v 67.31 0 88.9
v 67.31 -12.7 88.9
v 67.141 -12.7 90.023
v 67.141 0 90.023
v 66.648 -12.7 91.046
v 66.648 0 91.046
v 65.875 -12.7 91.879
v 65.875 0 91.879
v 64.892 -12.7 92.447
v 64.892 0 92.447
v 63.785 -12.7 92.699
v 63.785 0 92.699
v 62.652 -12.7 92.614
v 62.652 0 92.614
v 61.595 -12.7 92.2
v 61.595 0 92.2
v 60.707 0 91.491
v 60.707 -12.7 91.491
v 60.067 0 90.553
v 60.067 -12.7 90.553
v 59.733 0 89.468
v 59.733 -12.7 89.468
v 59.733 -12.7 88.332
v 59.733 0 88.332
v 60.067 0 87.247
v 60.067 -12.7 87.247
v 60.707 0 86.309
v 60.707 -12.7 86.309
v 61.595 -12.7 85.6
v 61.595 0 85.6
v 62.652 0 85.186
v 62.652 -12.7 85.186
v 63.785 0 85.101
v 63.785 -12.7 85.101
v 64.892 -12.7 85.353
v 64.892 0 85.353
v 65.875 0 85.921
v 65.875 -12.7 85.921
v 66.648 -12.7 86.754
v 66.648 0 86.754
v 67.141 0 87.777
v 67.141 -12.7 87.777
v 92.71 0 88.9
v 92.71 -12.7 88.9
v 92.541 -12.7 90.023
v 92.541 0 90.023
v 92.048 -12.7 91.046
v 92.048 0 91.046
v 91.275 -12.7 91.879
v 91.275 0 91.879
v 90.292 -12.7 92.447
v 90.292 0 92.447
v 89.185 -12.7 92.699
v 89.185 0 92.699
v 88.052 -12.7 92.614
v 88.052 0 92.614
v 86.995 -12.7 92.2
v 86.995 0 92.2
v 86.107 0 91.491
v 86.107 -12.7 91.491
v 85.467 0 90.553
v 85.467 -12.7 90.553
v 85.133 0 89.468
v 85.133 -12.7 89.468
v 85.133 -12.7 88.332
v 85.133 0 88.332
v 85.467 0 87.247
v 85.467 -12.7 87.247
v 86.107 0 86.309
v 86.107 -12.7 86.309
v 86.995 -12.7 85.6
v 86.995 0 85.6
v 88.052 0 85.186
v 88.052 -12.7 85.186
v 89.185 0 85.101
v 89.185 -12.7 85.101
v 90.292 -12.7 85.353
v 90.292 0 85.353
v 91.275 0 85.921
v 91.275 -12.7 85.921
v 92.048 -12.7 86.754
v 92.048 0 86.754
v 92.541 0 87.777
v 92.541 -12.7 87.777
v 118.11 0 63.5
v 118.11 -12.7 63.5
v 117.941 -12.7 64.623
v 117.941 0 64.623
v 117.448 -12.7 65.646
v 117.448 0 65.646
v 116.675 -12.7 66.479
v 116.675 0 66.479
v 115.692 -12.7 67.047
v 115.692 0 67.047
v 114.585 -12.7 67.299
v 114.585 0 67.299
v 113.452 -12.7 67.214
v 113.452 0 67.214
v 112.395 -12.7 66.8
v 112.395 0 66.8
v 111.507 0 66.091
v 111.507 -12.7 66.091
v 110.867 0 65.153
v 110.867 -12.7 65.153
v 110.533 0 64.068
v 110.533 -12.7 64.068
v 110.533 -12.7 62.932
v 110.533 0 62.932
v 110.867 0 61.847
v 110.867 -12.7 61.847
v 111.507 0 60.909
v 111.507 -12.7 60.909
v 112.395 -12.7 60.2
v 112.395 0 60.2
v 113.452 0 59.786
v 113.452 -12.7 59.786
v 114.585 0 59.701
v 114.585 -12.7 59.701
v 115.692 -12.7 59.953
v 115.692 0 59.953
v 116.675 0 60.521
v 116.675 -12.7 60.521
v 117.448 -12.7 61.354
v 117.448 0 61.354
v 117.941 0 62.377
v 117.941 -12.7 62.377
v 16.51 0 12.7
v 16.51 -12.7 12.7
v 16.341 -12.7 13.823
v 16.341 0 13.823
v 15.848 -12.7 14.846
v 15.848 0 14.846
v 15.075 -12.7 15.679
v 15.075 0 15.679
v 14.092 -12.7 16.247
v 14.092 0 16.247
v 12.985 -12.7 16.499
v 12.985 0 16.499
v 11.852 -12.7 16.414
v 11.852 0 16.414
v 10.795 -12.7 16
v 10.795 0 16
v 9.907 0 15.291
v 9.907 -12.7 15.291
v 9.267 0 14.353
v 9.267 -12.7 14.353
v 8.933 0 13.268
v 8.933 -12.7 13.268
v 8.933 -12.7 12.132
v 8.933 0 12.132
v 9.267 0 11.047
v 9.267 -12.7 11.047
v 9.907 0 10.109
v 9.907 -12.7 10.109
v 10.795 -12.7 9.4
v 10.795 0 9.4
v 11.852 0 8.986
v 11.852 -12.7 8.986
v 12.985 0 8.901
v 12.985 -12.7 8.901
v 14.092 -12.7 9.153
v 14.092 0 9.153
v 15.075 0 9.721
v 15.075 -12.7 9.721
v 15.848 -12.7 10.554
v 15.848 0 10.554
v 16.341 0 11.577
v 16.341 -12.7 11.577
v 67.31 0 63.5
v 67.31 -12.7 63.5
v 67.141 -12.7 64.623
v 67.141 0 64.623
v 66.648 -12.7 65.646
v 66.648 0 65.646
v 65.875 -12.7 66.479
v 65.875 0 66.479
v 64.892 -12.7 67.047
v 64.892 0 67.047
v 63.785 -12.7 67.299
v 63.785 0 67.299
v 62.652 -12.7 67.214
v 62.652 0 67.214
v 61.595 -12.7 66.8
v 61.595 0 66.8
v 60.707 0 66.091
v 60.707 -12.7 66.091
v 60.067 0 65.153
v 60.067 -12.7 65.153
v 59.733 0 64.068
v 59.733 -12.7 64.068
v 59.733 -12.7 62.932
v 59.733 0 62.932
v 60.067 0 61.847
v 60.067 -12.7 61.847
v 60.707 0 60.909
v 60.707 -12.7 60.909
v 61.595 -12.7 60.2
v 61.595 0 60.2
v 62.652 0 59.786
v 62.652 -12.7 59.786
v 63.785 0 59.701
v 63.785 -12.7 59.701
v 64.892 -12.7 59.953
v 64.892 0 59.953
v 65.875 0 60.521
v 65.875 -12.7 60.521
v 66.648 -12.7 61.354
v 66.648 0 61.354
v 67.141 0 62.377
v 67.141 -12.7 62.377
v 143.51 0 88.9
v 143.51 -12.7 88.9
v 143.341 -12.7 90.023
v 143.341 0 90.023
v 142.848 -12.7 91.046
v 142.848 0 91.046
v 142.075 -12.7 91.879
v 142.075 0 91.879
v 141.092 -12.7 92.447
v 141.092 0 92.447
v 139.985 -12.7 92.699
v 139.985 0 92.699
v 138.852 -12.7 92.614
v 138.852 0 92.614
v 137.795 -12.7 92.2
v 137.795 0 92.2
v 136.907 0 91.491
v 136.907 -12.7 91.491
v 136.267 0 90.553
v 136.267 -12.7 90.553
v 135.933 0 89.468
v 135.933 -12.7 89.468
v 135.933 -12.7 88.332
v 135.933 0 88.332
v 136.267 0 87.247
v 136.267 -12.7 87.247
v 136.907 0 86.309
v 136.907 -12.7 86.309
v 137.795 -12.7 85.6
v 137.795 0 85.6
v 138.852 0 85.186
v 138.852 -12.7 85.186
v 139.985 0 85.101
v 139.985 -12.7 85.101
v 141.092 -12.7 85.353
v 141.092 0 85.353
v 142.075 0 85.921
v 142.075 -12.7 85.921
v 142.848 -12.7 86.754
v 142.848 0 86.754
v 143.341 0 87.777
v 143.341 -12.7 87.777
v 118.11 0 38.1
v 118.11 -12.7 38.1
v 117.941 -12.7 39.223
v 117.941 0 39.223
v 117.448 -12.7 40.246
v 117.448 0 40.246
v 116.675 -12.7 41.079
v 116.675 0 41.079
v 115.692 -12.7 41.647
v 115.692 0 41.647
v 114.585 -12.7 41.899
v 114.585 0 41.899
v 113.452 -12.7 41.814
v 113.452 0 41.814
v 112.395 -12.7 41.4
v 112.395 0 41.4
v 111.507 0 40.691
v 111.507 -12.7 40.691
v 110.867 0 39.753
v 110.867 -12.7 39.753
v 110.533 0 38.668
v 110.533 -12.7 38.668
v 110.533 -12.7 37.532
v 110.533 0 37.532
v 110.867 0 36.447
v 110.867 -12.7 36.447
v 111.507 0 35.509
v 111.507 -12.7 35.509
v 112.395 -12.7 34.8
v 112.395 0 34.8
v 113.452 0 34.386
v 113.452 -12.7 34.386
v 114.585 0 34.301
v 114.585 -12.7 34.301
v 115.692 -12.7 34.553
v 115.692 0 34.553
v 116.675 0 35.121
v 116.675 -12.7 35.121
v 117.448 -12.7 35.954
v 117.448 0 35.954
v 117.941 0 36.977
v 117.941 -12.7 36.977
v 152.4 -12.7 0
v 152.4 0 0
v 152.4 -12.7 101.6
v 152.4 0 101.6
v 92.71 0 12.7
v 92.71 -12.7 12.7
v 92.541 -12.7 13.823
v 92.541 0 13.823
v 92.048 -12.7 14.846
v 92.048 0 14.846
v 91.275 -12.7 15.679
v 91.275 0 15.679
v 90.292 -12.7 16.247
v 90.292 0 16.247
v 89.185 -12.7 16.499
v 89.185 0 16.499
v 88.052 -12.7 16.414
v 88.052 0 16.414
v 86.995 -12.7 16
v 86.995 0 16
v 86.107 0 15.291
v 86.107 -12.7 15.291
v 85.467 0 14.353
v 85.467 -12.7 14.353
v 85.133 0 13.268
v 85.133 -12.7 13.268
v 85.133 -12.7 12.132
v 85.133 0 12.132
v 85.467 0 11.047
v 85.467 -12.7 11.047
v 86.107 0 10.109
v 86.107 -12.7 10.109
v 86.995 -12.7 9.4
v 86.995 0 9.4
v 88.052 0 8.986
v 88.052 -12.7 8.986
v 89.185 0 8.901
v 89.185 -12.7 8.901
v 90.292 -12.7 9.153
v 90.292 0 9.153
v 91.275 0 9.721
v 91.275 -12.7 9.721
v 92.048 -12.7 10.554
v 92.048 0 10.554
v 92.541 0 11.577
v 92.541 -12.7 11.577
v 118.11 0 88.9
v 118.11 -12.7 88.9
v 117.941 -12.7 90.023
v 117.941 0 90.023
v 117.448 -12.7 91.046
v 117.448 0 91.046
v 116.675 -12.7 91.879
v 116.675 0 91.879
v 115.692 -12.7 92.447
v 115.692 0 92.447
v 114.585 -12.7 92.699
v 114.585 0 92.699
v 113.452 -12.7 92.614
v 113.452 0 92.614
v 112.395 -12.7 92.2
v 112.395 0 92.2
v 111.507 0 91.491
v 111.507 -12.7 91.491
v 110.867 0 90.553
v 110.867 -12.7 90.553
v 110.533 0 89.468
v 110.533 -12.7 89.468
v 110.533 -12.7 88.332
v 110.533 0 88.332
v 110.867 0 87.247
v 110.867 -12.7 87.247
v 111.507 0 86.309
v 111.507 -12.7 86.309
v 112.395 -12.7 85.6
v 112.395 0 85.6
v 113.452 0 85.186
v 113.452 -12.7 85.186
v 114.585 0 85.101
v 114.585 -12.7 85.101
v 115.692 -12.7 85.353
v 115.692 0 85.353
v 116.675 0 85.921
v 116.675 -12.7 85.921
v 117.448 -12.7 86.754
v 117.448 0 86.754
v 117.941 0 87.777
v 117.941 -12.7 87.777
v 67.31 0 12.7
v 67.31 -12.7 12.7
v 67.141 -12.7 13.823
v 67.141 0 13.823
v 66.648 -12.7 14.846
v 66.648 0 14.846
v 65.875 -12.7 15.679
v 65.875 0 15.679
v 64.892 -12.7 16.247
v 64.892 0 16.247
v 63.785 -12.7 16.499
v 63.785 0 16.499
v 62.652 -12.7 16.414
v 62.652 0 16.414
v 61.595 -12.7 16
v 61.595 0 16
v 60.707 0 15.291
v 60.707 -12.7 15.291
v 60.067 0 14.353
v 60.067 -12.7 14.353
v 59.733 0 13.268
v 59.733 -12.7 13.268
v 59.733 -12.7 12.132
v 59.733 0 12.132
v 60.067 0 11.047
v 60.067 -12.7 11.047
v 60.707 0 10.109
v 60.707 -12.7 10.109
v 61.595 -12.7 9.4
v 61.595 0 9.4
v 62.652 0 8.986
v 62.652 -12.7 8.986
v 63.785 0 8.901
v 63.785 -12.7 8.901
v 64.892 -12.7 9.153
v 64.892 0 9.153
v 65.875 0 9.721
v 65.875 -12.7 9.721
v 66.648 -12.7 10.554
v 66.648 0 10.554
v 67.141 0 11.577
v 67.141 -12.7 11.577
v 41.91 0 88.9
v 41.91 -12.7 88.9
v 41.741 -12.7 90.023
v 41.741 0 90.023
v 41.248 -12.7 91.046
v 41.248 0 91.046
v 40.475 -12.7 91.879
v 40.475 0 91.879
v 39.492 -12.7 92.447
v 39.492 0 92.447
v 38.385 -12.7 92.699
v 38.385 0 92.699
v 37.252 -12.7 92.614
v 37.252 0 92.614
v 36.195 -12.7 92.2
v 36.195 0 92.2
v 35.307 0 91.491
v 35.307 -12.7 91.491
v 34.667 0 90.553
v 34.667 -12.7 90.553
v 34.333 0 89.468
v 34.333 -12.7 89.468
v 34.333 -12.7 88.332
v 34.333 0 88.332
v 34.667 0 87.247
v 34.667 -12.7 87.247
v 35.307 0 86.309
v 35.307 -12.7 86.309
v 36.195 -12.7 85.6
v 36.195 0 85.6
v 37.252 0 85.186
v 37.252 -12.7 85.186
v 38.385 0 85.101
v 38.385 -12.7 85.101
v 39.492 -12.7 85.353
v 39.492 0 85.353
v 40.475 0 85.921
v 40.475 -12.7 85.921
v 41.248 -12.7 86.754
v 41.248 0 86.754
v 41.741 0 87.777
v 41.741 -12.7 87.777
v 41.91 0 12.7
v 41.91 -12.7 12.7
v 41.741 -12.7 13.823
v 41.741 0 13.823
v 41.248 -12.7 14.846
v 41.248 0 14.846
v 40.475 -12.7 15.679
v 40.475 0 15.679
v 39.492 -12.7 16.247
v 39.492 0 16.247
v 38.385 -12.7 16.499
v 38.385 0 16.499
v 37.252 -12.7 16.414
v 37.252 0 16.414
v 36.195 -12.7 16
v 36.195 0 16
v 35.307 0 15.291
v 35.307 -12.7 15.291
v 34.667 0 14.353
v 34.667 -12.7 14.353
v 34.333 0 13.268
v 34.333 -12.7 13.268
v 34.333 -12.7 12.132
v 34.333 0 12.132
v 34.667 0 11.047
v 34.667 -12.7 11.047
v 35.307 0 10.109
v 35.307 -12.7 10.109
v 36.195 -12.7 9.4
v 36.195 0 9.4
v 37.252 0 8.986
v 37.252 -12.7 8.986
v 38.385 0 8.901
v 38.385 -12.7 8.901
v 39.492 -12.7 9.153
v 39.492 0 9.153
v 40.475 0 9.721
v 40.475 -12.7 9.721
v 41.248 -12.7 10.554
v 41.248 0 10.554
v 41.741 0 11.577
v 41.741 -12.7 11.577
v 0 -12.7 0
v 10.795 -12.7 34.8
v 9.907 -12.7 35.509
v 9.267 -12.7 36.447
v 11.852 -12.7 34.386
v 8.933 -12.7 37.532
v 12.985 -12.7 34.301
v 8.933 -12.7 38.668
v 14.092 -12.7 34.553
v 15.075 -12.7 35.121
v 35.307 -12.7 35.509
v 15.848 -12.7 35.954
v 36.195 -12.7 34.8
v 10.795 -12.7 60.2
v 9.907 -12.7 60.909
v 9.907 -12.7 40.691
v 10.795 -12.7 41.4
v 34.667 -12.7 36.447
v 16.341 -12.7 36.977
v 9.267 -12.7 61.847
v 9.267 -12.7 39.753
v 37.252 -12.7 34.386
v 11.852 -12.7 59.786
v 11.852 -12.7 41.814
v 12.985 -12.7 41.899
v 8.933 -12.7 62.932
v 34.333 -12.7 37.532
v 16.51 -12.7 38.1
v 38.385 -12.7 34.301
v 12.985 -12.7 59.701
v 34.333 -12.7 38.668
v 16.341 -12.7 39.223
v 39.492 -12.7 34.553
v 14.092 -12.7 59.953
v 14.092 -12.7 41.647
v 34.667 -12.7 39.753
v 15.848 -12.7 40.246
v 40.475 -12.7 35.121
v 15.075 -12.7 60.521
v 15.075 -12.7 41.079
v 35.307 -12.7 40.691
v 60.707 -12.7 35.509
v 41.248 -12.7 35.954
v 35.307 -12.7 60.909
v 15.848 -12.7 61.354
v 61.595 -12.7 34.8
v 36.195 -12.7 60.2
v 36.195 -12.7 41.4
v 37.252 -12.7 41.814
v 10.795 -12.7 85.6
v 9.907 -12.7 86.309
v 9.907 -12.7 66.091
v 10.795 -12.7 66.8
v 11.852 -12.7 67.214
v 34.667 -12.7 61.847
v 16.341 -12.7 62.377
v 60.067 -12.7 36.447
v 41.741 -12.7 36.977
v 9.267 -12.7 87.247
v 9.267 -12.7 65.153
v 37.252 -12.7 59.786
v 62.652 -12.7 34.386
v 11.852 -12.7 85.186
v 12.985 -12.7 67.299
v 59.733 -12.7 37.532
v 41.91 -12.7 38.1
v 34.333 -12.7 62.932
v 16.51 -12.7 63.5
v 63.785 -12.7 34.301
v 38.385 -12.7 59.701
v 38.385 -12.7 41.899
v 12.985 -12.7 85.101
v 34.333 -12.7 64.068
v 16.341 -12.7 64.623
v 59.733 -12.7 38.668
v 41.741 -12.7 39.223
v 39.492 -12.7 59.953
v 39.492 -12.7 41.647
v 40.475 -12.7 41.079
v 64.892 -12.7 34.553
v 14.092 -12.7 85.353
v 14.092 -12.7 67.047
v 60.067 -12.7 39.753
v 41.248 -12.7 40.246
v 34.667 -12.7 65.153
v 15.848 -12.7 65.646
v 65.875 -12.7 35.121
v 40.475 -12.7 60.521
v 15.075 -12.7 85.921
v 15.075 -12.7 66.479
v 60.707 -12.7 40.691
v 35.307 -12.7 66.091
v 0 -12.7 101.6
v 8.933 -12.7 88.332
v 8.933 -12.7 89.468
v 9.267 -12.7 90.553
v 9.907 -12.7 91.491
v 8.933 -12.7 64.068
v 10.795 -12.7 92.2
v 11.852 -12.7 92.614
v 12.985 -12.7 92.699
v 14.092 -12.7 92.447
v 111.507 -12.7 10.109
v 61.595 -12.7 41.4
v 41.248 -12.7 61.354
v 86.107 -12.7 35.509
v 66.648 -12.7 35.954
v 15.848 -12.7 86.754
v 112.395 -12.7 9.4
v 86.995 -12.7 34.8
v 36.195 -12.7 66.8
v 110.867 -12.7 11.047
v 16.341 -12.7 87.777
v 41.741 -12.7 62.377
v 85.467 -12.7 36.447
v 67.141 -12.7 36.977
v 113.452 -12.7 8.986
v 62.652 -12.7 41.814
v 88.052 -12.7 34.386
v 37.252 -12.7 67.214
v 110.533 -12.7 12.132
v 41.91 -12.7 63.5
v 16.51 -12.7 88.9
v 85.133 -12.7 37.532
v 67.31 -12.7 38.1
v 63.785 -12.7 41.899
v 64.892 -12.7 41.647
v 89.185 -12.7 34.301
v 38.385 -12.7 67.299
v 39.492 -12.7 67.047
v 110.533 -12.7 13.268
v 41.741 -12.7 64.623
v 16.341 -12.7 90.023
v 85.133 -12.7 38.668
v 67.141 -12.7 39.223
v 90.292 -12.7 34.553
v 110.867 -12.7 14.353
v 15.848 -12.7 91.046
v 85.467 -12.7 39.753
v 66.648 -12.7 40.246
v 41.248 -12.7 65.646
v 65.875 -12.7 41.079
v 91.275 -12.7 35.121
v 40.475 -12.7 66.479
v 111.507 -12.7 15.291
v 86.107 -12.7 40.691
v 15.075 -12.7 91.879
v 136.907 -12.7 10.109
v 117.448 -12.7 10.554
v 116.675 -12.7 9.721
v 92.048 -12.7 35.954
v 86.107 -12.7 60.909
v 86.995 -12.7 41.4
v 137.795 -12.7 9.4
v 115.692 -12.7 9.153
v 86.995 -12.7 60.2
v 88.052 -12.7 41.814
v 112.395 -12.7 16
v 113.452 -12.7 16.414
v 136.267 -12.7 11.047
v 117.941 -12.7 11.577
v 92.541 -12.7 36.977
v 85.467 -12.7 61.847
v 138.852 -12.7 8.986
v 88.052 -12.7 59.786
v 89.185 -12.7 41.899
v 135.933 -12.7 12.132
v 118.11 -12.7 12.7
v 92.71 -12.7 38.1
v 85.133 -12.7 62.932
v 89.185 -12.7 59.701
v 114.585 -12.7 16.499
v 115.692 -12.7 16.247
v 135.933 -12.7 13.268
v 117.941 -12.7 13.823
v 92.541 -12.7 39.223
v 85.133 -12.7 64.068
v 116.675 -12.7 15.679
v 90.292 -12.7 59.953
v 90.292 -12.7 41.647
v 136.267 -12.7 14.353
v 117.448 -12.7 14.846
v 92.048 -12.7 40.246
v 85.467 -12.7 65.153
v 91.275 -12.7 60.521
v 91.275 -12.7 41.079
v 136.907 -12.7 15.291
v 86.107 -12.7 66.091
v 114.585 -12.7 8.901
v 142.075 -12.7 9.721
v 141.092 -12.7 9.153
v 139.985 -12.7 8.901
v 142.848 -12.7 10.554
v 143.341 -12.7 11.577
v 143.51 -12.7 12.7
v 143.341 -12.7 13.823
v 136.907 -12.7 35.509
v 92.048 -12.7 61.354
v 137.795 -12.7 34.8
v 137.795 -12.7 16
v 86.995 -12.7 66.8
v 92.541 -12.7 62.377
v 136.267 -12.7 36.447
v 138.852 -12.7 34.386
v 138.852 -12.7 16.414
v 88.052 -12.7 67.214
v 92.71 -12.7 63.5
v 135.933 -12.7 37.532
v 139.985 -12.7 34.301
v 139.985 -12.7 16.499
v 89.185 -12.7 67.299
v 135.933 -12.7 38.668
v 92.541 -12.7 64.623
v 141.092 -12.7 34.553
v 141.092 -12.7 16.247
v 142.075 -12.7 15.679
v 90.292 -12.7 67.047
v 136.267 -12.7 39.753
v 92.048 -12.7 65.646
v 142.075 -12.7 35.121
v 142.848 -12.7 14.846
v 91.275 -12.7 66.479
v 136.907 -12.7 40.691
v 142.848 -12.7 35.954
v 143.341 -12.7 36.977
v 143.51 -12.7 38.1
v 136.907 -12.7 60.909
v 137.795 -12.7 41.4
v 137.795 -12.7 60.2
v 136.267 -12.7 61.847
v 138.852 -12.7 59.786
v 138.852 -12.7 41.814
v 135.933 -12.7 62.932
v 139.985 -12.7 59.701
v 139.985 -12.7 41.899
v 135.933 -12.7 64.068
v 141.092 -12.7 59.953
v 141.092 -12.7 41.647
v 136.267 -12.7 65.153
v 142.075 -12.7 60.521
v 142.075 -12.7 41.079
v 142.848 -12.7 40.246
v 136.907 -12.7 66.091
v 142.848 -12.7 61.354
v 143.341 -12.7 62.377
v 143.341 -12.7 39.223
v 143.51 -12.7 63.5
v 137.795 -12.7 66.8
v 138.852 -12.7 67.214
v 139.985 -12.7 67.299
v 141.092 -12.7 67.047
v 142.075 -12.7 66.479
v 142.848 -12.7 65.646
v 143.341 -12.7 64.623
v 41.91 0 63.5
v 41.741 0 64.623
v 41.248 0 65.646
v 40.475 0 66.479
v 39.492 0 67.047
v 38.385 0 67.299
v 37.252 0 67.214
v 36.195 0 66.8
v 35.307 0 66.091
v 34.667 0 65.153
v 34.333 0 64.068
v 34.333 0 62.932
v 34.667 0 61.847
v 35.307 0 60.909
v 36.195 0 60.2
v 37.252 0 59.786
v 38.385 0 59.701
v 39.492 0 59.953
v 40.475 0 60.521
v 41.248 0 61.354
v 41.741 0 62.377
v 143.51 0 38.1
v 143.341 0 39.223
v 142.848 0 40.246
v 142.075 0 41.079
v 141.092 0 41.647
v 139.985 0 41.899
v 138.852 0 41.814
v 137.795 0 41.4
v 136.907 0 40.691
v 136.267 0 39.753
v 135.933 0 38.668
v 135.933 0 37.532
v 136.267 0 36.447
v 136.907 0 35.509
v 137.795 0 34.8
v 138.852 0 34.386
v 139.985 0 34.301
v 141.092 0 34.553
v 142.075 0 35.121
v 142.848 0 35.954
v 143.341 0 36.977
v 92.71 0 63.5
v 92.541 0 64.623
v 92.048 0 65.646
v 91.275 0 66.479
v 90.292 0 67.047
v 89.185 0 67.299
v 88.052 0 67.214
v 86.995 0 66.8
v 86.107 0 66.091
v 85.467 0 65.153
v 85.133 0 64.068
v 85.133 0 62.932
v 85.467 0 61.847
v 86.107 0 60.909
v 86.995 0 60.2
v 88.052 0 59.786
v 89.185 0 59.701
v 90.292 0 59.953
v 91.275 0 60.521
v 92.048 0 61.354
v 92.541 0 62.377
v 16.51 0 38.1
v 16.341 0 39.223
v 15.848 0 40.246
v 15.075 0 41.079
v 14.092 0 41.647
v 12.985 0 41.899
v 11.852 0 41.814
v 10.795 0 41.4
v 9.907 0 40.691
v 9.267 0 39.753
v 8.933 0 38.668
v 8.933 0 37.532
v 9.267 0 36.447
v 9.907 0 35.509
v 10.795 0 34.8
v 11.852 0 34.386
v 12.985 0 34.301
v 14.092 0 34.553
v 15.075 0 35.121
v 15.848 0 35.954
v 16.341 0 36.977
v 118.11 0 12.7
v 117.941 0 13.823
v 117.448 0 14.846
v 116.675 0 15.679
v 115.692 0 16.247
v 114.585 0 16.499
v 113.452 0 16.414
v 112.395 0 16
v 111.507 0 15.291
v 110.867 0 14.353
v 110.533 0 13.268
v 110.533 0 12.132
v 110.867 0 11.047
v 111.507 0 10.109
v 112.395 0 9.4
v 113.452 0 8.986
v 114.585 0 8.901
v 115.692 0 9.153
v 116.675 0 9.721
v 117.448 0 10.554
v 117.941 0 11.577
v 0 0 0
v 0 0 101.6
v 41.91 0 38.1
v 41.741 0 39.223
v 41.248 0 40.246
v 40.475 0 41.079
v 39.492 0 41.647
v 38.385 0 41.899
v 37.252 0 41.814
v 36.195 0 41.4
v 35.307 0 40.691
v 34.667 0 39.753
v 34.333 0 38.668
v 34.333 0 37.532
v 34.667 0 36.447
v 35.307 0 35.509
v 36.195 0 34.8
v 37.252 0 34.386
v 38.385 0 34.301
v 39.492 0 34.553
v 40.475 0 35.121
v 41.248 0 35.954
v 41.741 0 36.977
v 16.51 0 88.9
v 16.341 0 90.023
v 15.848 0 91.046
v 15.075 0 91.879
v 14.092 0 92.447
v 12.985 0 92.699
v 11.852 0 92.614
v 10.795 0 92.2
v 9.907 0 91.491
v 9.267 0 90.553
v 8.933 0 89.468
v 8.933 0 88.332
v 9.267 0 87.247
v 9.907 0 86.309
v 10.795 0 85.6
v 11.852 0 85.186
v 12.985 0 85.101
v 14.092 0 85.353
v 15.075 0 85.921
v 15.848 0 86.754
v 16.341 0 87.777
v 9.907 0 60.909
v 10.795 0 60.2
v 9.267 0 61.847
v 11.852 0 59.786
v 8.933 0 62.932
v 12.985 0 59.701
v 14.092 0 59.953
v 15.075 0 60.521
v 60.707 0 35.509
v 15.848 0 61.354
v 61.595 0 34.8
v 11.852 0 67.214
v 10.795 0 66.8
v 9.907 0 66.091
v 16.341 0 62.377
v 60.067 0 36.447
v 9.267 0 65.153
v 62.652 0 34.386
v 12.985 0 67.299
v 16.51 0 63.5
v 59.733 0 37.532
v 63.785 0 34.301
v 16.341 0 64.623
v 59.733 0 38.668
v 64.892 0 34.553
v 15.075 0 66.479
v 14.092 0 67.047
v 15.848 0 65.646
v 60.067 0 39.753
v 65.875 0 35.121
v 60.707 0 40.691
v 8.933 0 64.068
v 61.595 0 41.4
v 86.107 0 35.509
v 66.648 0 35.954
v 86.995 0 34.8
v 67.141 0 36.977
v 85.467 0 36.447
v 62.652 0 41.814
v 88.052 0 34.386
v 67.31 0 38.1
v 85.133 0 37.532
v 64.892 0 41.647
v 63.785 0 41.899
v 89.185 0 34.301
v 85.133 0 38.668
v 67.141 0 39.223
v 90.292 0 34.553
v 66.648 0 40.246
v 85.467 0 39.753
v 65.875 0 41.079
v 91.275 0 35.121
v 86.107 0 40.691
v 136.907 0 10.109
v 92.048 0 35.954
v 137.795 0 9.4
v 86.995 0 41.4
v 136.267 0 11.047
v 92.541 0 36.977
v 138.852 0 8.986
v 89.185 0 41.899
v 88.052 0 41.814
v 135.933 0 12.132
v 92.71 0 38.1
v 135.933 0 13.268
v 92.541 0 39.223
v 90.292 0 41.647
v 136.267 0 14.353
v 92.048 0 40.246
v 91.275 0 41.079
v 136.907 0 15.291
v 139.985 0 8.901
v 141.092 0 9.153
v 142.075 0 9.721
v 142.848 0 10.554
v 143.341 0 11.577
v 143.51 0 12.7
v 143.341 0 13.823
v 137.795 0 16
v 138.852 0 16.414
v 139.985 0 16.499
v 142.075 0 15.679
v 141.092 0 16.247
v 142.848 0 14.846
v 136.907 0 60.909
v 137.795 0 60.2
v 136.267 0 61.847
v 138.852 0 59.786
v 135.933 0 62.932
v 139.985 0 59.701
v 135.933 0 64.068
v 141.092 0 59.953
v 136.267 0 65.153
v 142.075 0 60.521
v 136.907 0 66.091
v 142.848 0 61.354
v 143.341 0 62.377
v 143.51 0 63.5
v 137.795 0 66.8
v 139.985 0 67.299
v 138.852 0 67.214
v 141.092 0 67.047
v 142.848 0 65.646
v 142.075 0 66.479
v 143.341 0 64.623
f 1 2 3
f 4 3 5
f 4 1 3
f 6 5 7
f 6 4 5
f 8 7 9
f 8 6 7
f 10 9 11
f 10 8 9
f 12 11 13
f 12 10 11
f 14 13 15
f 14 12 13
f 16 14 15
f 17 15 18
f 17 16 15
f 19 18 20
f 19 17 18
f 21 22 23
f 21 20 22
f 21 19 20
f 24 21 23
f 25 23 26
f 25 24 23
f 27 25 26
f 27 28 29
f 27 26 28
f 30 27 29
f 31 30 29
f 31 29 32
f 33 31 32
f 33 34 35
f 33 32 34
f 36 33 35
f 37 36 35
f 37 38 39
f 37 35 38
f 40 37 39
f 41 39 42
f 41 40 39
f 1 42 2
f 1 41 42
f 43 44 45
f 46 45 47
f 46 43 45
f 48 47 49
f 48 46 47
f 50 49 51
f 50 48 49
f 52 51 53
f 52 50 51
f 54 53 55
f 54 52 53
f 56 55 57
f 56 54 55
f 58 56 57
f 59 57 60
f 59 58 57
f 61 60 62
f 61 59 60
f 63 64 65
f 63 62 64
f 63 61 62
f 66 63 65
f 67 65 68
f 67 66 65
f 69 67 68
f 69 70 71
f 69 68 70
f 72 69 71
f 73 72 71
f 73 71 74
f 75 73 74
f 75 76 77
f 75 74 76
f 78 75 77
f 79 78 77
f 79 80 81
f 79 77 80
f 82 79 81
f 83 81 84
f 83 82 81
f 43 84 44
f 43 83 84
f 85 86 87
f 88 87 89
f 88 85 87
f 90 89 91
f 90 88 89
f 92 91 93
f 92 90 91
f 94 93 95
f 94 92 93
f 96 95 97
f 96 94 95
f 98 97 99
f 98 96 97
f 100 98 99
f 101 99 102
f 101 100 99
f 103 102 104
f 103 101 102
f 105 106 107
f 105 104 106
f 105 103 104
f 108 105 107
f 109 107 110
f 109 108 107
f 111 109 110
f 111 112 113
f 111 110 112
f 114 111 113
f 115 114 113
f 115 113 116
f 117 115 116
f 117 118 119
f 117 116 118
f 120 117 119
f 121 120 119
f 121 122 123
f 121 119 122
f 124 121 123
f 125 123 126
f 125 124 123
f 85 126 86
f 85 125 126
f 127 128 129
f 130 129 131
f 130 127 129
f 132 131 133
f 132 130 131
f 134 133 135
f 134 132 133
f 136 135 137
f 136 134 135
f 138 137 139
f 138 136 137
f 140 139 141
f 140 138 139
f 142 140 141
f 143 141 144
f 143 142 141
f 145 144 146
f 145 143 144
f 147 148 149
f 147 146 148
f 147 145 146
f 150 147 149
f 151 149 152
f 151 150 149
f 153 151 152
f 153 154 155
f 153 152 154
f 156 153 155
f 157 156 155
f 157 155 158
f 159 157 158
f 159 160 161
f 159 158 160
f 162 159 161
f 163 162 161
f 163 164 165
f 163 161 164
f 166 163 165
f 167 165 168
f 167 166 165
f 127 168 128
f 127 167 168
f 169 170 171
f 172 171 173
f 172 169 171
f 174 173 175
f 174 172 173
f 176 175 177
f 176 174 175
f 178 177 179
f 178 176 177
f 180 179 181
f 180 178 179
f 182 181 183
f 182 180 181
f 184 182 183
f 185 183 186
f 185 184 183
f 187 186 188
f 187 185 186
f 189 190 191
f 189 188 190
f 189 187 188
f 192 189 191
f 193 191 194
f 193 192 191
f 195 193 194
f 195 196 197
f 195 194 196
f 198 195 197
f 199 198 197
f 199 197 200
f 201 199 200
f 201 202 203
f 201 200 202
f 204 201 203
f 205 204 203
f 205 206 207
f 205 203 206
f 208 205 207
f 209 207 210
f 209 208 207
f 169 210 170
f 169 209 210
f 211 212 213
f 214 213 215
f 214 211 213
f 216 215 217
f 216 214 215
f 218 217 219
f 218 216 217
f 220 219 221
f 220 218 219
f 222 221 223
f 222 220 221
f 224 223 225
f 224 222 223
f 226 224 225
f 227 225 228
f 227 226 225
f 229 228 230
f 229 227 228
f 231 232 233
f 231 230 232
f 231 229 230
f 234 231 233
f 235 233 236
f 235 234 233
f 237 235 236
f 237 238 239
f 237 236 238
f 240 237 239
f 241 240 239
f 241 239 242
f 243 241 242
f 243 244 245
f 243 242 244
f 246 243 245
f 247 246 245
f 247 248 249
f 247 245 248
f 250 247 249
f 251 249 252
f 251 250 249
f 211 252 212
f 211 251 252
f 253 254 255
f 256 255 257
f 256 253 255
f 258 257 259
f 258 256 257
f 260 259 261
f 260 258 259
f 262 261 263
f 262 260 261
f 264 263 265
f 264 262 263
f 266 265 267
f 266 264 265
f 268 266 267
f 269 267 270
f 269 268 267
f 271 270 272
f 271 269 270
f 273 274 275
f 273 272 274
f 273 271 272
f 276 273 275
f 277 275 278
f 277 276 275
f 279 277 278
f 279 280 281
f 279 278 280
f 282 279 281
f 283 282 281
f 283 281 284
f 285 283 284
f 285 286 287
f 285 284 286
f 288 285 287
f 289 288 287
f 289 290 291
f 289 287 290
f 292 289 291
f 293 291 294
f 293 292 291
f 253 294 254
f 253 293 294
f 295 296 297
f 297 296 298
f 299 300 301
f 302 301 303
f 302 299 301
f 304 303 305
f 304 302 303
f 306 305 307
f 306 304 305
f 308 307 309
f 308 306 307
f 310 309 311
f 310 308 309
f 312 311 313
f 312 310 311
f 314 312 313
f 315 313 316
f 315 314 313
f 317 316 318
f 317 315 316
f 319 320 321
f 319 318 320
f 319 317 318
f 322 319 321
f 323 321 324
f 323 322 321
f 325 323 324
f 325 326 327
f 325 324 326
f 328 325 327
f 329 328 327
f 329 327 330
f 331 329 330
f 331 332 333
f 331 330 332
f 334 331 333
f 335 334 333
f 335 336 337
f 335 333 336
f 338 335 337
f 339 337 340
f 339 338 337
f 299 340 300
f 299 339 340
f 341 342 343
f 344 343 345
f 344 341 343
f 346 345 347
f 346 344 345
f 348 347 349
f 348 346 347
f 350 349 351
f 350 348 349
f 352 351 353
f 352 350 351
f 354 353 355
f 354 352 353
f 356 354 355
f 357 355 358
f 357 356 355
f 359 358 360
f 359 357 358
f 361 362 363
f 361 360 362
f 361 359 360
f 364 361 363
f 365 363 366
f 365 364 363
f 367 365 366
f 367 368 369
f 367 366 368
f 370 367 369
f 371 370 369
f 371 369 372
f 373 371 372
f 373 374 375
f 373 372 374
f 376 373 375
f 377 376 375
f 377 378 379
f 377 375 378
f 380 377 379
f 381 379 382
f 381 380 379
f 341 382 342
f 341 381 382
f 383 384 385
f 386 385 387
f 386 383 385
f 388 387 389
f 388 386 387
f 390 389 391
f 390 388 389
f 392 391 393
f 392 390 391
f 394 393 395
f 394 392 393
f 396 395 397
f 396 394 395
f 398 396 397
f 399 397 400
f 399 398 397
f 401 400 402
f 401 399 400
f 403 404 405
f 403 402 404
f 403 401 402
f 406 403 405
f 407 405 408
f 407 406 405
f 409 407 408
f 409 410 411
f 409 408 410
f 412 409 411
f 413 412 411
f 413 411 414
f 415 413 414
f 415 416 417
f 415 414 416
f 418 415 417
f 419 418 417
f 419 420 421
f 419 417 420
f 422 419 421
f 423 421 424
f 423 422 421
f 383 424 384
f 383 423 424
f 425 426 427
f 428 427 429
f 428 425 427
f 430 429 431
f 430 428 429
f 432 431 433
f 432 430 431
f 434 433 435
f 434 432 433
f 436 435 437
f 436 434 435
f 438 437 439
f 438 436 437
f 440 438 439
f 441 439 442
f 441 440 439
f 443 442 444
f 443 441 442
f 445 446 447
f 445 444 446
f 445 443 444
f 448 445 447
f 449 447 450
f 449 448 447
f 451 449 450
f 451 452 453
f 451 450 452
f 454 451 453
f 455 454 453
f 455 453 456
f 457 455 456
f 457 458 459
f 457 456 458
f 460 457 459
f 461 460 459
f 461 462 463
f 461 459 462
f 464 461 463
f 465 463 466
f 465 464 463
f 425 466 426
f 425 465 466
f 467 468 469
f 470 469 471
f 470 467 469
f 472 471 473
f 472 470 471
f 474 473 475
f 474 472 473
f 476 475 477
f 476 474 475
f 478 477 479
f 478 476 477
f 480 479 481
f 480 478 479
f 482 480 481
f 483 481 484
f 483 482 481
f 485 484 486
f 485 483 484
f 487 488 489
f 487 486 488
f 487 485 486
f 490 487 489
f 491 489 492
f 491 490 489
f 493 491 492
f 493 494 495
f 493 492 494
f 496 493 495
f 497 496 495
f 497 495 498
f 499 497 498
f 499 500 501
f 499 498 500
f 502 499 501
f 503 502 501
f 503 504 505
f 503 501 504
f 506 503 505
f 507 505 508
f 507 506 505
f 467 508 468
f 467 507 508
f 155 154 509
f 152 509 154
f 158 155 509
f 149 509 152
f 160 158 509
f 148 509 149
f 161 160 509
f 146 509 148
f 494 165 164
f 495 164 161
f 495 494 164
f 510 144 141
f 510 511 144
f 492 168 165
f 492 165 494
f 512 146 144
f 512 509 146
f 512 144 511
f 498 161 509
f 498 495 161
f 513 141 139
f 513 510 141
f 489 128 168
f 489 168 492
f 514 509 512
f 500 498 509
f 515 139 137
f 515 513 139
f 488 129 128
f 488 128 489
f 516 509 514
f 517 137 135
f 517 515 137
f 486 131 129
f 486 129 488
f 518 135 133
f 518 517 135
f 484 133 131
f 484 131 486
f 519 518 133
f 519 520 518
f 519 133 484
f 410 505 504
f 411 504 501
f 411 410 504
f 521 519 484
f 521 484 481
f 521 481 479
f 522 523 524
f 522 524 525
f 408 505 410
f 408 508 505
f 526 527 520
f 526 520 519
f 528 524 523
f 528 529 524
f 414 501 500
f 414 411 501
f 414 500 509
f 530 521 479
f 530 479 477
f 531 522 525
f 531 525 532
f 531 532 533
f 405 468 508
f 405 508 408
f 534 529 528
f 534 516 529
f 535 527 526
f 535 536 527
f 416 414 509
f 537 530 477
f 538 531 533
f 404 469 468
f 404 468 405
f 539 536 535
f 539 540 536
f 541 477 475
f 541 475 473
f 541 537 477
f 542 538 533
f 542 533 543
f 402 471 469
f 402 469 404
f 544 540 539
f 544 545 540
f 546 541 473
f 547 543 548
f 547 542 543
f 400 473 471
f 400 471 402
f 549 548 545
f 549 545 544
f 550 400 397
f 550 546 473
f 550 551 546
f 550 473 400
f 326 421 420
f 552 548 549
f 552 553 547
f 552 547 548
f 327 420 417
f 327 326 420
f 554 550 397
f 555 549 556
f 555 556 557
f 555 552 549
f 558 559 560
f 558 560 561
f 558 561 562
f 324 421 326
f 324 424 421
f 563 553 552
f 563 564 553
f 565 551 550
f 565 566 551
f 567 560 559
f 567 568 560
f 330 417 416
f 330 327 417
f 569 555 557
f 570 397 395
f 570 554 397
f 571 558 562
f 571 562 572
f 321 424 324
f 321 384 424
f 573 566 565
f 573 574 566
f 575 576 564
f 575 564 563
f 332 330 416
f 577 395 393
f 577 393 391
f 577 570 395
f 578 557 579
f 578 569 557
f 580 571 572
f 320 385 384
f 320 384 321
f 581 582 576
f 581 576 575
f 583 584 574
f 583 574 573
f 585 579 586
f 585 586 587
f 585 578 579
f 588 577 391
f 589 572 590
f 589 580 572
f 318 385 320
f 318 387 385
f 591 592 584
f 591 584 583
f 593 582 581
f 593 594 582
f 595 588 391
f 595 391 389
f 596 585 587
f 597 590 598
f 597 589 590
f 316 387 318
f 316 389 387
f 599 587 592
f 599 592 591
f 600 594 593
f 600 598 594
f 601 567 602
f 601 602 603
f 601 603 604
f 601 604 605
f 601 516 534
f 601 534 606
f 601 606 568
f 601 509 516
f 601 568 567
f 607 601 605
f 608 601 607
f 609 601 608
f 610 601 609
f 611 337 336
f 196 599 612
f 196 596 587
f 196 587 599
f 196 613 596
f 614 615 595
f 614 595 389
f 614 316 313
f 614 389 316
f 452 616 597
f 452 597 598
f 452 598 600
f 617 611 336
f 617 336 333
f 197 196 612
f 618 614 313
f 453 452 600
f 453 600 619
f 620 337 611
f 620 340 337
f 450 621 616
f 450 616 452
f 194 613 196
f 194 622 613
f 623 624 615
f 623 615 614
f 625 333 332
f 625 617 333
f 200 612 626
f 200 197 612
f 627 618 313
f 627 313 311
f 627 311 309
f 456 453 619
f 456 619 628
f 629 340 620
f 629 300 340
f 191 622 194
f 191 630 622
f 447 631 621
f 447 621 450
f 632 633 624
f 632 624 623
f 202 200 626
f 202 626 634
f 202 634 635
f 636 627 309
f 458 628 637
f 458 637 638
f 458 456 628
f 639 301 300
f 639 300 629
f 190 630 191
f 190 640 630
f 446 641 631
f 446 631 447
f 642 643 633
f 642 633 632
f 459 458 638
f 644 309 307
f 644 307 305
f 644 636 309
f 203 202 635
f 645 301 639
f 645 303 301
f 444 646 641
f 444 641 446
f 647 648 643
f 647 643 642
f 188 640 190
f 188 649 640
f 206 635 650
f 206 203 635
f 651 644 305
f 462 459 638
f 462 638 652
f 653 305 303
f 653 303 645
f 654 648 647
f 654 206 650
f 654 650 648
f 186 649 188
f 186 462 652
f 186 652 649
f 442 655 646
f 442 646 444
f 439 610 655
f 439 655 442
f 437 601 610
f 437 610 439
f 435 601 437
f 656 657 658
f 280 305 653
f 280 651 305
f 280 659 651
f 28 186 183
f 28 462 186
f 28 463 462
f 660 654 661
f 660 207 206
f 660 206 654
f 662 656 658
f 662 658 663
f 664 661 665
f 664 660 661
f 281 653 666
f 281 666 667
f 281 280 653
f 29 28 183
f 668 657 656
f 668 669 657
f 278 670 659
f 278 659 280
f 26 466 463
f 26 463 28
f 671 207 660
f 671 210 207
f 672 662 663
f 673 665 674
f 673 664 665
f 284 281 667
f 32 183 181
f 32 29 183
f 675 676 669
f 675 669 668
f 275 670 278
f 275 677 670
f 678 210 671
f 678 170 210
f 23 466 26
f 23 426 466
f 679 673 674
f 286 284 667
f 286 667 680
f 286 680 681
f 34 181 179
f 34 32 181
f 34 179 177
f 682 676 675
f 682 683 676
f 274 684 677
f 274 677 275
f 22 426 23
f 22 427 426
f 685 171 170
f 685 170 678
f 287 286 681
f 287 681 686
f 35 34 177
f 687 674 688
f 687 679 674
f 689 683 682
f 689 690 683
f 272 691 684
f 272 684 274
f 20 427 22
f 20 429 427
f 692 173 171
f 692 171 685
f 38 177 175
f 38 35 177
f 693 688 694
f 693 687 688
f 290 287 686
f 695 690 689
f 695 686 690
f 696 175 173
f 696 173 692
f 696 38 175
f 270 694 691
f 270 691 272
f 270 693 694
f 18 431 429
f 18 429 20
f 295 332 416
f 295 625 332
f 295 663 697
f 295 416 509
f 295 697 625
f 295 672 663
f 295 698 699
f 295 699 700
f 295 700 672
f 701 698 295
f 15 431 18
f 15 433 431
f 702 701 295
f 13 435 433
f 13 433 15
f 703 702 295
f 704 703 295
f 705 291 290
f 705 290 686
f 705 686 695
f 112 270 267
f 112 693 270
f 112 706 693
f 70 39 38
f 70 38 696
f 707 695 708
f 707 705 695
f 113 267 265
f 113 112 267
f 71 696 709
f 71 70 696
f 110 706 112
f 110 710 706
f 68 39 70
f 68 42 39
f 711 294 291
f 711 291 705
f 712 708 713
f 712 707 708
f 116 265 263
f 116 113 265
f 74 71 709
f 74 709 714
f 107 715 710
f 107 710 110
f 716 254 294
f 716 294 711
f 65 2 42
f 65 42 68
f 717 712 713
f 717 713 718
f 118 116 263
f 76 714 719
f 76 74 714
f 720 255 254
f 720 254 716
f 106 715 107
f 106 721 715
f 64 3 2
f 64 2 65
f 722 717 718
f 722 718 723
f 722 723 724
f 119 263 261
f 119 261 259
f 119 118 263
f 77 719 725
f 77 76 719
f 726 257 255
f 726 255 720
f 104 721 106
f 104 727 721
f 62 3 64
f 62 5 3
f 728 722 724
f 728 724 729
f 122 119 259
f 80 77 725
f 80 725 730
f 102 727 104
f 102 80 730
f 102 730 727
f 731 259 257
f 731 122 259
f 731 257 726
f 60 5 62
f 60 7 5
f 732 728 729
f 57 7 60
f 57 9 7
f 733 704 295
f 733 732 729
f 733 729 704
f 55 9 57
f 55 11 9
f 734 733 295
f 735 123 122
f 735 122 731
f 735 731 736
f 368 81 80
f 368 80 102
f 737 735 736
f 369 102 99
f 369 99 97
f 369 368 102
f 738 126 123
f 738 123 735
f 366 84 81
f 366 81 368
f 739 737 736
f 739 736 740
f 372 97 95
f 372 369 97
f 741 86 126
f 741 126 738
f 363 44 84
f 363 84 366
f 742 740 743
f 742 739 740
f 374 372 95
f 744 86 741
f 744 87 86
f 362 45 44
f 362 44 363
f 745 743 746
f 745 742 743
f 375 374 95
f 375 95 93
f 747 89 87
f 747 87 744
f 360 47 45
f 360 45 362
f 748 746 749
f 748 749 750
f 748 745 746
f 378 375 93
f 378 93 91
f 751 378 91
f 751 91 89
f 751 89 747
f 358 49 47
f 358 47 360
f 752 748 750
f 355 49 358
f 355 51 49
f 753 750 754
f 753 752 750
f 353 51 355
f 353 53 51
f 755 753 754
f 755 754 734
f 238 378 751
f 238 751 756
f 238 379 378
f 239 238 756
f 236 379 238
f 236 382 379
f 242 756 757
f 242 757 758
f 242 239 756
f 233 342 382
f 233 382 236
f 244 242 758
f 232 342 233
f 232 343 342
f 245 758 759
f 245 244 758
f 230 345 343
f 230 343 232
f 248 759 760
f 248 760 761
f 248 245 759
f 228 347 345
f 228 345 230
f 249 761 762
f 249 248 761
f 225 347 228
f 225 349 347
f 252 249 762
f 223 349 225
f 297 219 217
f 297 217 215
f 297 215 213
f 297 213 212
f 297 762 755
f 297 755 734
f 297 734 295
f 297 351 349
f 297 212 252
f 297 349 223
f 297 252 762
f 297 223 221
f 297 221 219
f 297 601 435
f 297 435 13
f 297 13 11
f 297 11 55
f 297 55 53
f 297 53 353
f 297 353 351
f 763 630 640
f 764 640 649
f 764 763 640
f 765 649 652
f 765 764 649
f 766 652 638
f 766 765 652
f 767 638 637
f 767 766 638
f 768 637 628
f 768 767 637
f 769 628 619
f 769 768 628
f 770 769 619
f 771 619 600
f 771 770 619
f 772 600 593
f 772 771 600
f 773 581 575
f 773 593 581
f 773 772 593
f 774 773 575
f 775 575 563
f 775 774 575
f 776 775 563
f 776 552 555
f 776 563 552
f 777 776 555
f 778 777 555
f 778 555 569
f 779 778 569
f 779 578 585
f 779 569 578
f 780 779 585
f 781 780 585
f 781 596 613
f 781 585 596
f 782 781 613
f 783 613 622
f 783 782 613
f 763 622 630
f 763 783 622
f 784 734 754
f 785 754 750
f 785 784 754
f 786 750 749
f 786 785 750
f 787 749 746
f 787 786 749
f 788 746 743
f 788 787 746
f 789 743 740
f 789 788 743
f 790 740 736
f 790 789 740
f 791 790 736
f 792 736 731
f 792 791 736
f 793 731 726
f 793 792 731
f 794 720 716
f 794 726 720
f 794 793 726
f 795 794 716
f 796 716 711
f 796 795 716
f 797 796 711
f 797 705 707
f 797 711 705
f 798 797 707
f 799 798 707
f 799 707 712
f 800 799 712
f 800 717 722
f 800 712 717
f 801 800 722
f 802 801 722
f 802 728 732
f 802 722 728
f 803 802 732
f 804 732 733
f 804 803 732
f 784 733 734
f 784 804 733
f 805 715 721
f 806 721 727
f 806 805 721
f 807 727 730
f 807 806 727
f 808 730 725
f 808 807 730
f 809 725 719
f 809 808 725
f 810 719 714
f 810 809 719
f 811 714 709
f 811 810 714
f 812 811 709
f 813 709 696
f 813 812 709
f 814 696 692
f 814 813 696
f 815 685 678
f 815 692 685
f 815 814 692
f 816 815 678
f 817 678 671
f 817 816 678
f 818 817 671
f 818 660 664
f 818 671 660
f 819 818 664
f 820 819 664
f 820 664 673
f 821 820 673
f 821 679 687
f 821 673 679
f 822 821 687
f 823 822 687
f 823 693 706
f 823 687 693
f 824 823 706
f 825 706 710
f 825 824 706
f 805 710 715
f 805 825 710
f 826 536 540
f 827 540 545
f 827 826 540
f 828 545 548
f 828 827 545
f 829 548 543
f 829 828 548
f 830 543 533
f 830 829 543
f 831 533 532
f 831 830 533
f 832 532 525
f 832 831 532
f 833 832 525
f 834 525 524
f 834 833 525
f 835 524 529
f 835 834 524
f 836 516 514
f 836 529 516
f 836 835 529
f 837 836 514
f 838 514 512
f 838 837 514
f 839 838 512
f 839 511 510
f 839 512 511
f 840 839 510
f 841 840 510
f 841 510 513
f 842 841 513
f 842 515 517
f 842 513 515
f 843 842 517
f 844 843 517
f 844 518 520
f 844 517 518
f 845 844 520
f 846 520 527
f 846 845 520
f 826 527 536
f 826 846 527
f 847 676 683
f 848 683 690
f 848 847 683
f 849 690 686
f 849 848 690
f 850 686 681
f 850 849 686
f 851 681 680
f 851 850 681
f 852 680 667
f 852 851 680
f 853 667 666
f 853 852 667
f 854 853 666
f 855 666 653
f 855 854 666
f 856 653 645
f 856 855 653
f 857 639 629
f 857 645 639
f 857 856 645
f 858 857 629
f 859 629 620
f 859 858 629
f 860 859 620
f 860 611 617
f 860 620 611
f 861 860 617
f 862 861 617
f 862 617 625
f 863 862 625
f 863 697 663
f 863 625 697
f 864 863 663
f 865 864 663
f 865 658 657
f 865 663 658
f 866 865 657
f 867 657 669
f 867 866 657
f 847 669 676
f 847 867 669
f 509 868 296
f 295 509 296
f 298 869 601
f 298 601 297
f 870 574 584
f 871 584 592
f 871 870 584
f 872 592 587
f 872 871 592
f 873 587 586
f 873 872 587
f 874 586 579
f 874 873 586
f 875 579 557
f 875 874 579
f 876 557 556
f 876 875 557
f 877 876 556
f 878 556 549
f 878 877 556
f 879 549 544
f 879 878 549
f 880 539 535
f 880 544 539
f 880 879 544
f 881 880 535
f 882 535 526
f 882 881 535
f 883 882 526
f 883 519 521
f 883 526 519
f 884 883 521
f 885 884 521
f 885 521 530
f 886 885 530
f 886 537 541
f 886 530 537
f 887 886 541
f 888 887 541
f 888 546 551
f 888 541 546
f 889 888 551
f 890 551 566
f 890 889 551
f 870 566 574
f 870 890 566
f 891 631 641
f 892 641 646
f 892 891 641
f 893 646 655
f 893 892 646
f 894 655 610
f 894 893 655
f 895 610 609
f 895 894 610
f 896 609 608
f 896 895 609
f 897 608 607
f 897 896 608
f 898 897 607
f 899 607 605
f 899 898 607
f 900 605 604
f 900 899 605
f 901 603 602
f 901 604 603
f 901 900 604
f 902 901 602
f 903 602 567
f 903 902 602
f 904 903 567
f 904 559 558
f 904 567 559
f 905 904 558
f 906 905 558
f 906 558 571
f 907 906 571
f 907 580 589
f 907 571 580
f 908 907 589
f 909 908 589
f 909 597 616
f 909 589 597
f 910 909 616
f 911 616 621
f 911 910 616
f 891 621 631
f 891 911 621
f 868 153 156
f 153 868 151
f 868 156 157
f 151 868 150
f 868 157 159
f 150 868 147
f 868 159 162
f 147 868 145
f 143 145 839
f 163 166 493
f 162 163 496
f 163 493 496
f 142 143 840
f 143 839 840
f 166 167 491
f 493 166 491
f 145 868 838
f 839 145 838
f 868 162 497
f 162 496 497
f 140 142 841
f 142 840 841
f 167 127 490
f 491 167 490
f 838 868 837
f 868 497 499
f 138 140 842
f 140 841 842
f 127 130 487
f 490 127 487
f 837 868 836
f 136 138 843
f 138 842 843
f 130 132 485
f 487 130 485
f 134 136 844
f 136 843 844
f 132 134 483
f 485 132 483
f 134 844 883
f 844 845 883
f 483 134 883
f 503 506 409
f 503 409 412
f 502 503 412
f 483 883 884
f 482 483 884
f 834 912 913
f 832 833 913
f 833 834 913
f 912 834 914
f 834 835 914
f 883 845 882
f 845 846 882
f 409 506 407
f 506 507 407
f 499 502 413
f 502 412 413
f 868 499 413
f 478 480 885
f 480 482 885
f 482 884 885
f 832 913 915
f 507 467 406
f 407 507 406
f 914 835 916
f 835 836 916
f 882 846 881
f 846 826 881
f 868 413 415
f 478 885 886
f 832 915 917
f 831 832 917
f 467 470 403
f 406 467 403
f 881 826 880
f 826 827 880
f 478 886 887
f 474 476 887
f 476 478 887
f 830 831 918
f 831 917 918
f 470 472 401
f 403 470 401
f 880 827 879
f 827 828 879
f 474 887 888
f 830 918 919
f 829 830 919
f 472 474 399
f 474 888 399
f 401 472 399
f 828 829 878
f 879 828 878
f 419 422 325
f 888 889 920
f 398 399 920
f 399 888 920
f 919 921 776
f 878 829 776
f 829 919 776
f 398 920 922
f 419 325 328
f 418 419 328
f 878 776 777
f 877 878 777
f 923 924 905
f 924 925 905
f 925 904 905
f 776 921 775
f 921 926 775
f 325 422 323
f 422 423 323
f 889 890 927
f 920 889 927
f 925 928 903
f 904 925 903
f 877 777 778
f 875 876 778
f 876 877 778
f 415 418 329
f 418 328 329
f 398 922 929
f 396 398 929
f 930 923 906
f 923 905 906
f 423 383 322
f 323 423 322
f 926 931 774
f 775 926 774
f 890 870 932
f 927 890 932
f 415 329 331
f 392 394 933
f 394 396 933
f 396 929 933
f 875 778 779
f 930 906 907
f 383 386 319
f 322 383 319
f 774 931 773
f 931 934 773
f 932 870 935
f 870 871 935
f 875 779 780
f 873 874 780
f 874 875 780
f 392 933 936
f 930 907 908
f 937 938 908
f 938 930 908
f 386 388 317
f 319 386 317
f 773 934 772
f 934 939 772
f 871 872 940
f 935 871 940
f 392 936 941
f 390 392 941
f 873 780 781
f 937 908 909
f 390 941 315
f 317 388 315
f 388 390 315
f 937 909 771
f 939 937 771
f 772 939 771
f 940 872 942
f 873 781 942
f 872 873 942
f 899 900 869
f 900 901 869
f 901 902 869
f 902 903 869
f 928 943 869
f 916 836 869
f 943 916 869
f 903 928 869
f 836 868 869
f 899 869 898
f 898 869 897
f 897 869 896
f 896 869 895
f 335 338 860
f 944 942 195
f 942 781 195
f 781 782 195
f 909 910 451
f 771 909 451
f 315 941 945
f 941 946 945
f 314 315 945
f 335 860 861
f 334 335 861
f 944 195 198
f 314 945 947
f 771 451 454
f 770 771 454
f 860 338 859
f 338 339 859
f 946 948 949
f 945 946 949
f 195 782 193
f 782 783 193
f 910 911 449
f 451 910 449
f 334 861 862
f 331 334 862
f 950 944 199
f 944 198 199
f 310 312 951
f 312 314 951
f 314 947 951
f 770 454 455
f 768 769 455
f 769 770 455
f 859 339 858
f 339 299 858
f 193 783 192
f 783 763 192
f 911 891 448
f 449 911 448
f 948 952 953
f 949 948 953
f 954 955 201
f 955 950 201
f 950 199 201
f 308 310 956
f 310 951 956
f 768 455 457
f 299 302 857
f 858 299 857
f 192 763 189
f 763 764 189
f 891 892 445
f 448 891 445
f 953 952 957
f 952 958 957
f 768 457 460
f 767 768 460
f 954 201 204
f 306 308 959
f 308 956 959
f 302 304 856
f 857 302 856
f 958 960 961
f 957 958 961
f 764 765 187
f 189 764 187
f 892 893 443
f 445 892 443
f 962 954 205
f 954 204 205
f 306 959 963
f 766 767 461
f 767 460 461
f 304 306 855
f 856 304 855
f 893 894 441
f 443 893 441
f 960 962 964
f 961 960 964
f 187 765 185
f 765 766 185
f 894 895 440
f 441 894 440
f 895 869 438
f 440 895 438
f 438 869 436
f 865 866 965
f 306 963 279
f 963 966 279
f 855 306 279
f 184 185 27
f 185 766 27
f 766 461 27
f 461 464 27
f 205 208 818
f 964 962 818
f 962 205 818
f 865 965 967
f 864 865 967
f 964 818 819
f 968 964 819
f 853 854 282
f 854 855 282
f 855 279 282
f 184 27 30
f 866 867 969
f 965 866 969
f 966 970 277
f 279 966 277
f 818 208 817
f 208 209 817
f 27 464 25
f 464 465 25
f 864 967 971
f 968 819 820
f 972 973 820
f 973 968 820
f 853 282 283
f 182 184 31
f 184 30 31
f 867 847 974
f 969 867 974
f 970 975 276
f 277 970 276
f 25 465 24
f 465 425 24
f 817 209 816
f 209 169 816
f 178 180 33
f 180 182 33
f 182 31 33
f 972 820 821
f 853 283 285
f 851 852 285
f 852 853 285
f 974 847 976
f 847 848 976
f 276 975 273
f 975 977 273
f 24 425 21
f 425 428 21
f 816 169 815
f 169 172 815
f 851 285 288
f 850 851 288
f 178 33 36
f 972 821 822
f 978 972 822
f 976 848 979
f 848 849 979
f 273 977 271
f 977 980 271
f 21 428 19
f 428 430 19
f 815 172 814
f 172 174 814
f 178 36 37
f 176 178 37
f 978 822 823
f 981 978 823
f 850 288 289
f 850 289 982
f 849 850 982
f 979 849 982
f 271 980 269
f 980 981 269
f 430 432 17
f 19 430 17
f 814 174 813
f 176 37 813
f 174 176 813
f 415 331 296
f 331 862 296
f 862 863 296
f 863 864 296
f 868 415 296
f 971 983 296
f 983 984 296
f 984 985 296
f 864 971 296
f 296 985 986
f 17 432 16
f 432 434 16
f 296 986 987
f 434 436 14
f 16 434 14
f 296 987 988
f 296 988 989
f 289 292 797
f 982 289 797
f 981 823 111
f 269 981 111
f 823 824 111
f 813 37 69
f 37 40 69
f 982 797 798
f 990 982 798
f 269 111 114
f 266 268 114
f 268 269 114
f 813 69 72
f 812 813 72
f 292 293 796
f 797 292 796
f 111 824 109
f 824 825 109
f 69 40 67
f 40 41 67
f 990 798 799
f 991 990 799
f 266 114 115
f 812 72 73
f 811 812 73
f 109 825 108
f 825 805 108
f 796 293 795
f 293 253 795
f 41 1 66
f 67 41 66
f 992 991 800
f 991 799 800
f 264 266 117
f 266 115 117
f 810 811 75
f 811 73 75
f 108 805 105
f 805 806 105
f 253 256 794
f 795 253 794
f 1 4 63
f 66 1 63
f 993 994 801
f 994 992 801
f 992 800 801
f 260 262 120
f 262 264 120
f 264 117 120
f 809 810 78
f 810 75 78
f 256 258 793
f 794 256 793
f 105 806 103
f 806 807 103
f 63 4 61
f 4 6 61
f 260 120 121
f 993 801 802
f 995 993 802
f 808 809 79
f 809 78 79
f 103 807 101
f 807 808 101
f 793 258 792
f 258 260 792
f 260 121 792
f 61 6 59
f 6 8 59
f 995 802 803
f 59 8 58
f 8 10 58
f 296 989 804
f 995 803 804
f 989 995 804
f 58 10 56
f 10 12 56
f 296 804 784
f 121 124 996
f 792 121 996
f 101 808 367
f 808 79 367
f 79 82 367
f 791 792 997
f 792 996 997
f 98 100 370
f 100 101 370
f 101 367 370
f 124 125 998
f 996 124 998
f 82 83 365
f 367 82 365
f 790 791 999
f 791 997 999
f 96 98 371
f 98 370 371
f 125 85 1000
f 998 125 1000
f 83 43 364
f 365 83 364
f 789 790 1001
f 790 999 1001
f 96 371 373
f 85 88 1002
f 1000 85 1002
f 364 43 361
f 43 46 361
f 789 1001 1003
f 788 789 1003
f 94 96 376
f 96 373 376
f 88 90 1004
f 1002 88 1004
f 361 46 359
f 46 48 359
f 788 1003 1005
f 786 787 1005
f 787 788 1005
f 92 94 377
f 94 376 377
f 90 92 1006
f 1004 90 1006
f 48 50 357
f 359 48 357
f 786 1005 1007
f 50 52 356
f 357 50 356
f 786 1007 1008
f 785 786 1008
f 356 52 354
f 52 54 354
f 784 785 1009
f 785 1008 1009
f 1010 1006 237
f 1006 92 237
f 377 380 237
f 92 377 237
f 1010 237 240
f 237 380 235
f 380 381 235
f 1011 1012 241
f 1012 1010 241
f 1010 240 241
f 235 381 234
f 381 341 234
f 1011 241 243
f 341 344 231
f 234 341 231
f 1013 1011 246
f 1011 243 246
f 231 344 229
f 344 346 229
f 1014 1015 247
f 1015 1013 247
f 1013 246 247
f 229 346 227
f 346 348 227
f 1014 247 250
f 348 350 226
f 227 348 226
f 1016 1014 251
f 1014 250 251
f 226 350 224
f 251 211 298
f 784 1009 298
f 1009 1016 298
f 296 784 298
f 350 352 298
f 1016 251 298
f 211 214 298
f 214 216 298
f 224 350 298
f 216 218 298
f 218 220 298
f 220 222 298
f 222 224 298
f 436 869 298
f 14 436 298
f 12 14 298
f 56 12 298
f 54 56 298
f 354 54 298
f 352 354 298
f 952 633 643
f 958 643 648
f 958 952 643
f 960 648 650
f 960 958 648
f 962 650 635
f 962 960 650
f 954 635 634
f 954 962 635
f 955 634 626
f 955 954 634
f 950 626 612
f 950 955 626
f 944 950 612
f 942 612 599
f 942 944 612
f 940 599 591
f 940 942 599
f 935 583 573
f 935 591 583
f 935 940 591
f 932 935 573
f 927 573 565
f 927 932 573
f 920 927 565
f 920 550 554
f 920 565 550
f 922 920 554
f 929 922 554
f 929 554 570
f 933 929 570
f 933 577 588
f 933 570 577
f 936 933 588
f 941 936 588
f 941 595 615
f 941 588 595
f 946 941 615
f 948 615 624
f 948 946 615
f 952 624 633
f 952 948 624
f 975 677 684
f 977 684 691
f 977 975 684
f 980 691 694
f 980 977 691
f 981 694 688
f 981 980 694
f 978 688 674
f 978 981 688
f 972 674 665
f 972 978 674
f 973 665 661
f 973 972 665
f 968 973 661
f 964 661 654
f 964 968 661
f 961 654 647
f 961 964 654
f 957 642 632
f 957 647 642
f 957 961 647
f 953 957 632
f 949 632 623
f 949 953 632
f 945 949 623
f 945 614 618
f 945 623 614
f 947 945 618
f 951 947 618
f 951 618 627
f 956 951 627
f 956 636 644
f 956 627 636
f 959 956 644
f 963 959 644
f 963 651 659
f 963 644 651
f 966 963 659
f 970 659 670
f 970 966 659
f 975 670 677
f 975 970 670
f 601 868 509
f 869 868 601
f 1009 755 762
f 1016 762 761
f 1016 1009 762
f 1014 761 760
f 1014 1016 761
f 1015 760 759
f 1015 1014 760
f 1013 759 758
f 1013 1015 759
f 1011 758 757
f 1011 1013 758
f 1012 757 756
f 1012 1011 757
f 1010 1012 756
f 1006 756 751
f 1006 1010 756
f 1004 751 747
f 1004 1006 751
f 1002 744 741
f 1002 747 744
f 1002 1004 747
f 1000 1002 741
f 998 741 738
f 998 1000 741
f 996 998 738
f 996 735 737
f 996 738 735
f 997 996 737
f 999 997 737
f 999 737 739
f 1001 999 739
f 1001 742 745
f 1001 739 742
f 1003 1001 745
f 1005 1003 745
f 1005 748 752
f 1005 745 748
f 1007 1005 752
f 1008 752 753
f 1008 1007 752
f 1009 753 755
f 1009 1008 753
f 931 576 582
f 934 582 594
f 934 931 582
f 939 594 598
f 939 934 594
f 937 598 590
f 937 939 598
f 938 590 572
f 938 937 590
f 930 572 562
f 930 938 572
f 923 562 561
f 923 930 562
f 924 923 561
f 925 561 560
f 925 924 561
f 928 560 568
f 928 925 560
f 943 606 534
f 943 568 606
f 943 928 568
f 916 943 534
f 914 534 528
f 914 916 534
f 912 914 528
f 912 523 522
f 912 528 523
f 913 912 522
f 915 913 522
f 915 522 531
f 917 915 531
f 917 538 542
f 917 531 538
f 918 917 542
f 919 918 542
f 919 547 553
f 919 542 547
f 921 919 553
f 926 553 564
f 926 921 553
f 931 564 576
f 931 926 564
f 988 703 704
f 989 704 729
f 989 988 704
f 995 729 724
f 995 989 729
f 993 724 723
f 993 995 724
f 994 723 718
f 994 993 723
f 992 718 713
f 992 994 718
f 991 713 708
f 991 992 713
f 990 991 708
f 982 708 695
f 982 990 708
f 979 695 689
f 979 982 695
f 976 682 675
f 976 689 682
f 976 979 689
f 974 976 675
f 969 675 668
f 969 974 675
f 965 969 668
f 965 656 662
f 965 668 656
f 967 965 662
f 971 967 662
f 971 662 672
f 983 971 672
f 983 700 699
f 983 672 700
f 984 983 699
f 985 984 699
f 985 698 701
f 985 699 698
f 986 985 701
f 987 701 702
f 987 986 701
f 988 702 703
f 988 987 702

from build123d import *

# Parameters (mm, degrees)
F0_W     = 152.4
F0_H     = 101.6
F2_DEPTH = 12.7
F1_R     = 3.81
F3_DEPTH = 25.4


with BuildPart() as f2:
    # F0 (on Front) → F2 (new body)
    with BuildSketch(Plane.XZ):
        with Locations((76.2, 50.8)):
            Rectangle(F0_W, F0_H)
    extrude(amount=F2_DEPTH)

    # F1 (on face) → F3 (cut)
    with BuildSketch(Plane.XZ):
        with Locations((12.7, 12.7)):
            Circle(F1_R)
        with Locations((12.7, 38.1)):
            Circle(F1_R)
        with Locations((12.7, 63.5)):
            Circle(F1_R)
        with Locations((12.7, 88.9)):
            Circle(F1_R)
        with Locations((38.1, 12.7)):
            Circle(F1_R)
        with Locations((38.1, 38.1)):
            Circle(F1_R)
        with Locations((38.1, 63.5)):
            Circle(F1_R)
        with Locations((38.1, 88.9)):
            Circle(F1_R)
        with Locations((63.5, 12.7)):
            Circle(F1_R)
        with Locations((63.5, 38.1)):
            Circle(F1_R)
        with Locations((63.5, 63.5)):
            Circle(F1_R)
        with Locations((63.5, 88.9)):
            Circle(F1_R)
        with Locations((88.9, 12.7)):
            Circle(F1_R)
        with Locations((88.9, 38.1)):
            Circle(F1_R)
        with Locations((88.9, 63.5)):
            Circle(F1_R)
        with Locations((88.9, 88.9)):
            Circle(F1_R)
        with Locations((114.3, 12.7)):
            Circle(F1_R)
        with Locations((114.3, 38.1)):
            Circle(F1_R)
        with Locations((114.3, 63.5)):
            Circle(F1_R)
        with Locations((114.3, 88.9)):
            Circle(F1_R)
        with Locations((139.7, 12.7)):
            Circle(F1_R)
        with Locations((139.7, 38.1)):
            Circle(F1_R)
        with Locations((139.7, 63.5)):
            Circle(F1_R)
        with Locations((139.7, 88.9)):
            Circle(F1_R)
    extrude(amount=F3_DEPTH, mode=Mode.SUBTRACT)


solid = f2.part
